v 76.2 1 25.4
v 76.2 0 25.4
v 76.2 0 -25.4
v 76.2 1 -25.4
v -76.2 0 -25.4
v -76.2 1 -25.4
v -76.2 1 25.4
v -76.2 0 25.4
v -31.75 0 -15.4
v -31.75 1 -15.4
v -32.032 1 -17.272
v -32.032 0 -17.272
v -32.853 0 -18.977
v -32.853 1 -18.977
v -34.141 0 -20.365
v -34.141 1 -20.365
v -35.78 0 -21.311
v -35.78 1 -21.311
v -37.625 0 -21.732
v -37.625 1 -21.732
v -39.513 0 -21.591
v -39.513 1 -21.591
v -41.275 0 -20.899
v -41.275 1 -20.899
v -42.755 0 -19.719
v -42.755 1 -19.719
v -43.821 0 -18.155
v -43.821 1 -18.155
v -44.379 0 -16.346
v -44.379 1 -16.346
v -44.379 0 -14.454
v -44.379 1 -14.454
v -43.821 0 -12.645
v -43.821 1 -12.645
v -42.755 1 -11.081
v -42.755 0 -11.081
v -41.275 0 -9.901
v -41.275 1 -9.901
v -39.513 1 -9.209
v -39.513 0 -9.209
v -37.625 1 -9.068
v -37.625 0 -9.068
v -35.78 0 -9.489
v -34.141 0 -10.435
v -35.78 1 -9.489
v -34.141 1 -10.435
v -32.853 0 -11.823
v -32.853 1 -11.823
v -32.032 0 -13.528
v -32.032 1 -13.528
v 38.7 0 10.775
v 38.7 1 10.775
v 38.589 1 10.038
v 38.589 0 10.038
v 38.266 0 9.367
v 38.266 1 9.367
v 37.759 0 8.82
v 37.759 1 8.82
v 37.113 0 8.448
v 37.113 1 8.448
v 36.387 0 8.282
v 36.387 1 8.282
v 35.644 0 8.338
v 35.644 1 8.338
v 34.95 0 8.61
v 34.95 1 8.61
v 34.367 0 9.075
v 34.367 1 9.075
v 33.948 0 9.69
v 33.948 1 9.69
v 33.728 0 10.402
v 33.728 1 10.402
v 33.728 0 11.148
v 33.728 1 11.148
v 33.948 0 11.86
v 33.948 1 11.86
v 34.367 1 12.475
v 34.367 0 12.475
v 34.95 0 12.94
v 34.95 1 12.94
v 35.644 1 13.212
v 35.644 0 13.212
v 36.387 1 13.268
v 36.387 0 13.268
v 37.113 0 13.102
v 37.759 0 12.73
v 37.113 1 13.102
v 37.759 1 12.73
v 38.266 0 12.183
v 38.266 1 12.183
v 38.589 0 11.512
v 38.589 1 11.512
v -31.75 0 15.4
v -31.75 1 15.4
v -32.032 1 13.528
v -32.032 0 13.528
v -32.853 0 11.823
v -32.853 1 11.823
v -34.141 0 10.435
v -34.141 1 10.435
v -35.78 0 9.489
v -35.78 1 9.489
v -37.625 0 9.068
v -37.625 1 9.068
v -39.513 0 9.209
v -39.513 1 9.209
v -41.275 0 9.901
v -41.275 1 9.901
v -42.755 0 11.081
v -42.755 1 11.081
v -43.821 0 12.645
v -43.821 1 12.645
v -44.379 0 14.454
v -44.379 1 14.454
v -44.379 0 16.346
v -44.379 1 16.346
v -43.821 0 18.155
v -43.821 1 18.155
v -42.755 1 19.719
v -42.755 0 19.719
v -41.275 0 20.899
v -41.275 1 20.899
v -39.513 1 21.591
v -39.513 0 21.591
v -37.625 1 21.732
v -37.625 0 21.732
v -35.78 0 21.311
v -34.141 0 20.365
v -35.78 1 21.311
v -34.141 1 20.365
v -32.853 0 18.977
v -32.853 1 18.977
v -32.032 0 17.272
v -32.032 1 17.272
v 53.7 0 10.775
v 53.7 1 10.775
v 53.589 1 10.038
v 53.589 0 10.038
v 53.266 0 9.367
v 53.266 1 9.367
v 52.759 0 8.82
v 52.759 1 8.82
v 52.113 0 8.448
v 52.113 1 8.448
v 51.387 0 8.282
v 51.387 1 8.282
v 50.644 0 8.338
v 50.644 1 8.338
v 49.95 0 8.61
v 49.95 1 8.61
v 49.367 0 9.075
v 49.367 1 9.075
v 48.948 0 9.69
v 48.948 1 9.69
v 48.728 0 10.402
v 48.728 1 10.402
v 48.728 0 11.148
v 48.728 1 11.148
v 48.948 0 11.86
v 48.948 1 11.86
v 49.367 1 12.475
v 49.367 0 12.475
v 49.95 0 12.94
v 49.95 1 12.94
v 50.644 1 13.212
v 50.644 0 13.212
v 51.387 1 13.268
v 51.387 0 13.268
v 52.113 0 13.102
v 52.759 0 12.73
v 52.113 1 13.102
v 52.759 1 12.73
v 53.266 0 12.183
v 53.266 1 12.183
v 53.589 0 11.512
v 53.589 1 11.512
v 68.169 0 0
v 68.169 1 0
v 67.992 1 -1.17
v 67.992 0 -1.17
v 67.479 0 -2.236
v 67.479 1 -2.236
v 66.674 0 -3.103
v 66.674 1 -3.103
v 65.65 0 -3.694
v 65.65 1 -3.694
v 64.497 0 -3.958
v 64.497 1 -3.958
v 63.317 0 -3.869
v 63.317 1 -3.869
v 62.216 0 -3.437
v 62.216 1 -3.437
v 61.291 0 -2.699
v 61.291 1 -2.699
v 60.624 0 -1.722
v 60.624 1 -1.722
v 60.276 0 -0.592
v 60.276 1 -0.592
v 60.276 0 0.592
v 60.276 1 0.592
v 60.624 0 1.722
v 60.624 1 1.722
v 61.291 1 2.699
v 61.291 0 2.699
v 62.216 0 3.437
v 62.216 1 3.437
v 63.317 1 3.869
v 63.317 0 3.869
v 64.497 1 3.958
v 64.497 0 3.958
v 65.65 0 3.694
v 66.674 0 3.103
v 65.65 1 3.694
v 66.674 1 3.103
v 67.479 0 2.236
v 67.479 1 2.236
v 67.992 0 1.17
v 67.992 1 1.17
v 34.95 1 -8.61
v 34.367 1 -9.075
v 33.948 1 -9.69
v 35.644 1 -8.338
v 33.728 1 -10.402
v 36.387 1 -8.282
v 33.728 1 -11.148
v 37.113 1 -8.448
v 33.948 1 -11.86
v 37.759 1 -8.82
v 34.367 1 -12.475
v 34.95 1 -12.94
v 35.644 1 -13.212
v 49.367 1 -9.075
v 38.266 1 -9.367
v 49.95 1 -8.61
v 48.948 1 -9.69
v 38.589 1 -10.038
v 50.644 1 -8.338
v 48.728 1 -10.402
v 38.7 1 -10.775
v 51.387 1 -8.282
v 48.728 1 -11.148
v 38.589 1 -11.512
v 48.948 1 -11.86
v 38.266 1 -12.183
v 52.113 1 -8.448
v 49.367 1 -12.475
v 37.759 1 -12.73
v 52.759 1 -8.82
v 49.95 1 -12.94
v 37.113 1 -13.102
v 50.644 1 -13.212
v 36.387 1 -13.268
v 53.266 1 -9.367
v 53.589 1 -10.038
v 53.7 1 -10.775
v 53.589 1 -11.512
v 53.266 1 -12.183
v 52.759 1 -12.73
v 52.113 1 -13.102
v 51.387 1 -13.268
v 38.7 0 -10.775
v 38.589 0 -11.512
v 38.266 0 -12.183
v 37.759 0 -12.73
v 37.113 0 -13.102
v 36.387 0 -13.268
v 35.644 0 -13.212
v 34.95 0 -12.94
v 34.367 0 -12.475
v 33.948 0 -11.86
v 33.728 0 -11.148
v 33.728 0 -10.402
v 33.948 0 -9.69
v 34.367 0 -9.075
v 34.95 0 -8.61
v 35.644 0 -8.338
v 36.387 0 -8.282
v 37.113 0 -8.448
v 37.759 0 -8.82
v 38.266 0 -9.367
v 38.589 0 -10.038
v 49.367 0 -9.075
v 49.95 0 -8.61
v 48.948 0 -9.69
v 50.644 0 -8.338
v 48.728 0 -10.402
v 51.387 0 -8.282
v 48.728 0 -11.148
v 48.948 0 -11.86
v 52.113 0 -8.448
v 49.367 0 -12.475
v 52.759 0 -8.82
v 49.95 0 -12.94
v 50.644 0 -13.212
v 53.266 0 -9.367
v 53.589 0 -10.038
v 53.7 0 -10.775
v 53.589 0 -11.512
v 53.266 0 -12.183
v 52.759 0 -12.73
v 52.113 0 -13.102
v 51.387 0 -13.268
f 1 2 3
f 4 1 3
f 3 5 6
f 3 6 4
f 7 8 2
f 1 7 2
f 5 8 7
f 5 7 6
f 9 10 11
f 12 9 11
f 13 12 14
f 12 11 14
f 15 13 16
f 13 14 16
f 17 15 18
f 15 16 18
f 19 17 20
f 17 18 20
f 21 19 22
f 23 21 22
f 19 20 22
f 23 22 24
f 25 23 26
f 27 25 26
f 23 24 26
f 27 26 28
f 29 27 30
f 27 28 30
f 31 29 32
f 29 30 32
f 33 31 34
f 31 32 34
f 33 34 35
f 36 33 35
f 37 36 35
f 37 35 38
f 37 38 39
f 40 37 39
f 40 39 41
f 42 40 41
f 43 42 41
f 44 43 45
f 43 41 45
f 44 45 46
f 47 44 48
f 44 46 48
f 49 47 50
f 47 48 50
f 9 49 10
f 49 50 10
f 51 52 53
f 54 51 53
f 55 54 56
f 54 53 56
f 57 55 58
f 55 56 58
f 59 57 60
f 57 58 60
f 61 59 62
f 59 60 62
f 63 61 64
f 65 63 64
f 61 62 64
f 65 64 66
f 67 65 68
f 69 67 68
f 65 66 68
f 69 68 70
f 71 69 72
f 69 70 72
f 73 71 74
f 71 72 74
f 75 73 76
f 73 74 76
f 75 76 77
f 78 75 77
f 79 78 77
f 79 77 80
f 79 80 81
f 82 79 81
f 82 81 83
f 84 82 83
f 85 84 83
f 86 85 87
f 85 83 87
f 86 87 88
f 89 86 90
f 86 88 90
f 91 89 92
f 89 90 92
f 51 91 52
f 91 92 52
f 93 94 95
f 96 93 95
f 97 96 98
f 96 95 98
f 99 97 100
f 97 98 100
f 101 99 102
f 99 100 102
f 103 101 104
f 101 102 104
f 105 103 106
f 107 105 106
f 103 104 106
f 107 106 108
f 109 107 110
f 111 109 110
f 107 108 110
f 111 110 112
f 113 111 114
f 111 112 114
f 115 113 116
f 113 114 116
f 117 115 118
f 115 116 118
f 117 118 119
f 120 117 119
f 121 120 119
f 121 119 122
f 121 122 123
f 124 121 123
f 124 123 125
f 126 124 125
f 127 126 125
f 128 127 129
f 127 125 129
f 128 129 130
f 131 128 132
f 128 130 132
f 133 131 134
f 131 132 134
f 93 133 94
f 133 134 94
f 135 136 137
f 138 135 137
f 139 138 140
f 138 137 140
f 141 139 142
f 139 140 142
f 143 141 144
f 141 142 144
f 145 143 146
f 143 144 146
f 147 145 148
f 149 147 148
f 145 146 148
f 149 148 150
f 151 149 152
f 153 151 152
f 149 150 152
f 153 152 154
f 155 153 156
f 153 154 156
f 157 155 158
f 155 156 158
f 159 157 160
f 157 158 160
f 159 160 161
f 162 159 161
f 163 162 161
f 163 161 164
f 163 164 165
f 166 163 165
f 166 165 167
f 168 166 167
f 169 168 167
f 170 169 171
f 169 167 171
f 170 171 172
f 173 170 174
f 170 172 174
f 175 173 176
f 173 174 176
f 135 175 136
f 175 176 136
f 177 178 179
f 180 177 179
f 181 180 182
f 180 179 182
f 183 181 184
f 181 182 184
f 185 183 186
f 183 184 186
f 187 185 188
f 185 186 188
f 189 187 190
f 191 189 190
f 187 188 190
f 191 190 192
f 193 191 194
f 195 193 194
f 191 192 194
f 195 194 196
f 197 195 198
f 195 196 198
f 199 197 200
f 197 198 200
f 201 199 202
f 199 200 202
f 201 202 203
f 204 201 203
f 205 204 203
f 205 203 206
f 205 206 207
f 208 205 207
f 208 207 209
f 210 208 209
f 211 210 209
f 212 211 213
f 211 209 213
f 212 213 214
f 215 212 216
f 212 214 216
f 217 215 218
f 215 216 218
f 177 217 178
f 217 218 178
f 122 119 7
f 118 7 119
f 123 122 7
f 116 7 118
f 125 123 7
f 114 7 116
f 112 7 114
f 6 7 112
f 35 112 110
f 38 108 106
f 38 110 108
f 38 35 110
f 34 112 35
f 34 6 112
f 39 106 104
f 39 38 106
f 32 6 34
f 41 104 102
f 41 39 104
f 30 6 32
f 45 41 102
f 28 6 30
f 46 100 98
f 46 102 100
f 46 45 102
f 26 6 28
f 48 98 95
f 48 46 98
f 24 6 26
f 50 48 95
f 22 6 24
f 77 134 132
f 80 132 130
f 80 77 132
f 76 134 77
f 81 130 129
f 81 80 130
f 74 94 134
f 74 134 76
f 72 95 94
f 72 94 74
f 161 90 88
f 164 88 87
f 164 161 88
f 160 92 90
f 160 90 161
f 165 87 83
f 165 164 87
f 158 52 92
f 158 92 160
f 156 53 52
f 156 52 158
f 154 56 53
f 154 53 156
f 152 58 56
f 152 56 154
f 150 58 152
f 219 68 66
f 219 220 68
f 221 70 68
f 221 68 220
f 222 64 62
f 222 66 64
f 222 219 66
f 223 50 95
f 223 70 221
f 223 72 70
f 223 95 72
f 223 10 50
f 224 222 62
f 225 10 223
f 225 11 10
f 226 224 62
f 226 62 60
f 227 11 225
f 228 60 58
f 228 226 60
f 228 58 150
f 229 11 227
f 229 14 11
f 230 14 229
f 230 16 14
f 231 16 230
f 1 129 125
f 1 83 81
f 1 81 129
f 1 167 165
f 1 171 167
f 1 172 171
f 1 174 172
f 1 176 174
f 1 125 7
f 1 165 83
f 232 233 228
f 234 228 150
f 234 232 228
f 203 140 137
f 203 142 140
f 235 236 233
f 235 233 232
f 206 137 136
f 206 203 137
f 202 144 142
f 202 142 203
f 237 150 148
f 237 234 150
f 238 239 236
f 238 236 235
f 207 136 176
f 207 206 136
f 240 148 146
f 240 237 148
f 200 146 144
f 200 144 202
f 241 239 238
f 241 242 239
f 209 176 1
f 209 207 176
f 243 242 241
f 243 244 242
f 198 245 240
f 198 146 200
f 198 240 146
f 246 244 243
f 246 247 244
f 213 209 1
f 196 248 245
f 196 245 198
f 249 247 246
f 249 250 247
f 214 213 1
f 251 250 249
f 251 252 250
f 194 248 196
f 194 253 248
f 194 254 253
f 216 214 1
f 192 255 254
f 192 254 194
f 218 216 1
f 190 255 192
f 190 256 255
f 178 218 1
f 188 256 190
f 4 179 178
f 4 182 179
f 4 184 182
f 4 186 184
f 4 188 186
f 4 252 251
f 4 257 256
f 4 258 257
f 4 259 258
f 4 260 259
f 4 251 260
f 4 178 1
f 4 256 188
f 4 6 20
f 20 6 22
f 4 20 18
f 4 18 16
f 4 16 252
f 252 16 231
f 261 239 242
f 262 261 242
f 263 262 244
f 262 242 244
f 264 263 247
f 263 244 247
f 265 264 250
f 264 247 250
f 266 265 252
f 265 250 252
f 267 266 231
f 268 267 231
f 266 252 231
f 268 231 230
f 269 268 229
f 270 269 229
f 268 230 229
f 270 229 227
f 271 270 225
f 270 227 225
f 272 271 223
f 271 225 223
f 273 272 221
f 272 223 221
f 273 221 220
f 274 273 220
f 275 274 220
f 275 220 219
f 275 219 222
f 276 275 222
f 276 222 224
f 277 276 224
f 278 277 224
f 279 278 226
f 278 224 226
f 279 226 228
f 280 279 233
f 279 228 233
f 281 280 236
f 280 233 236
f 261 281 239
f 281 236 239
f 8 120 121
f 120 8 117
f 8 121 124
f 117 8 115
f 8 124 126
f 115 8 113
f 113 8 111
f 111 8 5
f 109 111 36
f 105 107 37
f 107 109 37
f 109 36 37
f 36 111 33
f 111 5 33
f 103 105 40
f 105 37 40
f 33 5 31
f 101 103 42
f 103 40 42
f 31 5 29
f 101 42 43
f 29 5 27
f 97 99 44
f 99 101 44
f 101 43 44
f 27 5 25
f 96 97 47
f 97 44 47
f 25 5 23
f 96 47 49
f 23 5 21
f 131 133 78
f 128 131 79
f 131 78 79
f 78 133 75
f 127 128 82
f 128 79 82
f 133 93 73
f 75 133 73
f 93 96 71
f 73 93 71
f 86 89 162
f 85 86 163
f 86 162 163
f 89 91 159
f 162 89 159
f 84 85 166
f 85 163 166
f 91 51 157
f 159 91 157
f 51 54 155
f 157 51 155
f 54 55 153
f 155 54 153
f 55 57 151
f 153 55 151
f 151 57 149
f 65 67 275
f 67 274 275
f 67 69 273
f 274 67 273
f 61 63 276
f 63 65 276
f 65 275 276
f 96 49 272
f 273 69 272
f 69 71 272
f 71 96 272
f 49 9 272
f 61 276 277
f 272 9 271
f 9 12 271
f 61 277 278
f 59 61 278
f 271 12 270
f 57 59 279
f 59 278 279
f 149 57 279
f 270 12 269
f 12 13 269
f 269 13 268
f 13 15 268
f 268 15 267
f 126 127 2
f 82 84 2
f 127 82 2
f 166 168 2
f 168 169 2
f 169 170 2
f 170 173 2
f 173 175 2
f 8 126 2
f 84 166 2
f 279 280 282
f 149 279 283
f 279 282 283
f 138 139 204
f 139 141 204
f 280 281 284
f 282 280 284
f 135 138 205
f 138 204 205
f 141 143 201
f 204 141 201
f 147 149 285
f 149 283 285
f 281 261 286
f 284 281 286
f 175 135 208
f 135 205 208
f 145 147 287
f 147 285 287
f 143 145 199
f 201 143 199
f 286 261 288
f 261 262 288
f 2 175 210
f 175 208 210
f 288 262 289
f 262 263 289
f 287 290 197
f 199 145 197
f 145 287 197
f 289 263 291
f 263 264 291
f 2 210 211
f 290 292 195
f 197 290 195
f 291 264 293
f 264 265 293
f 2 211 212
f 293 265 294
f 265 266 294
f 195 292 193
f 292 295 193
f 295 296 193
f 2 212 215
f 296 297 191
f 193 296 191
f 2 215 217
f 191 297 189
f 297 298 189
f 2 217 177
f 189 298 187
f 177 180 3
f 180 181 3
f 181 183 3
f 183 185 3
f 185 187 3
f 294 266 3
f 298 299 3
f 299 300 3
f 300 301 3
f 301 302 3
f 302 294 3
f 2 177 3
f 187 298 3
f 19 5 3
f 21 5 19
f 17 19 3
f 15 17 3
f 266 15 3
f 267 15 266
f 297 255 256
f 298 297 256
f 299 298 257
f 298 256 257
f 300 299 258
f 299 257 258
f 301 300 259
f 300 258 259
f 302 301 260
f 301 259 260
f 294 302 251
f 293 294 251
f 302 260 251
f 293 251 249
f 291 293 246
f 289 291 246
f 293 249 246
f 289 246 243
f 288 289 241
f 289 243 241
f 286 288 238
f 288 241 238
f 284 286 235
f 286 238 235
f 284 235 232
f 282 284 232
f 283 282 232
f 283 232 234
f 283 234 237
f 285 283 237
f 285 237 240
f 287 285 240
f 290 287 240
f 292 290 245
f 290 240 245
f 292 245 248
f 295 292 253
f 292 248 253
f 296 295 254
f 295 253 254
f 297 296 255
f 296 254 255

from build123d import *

# Parameters (mm, degrees)
ESQUISSE1_W             = 152.4
ESQUISSE1_H             = 50.8
BOSS_EXTRU_1_DEPTH      = 1
ESQUISSE2_R             = 6.35
ENL_V_MAT_EXTRU_1_DEPTH = 1
ESQUISSE3_R             = 2.5
ENL_V_MAT_EXTRU_2_DEPTH = 1
ESQUISSE4_R             = 3.96875
ENL_V_MAT_EXTRU_3_DEPTH = 1


with BuildPart() as part:
    # Esquisse1 → Boss.-Extru.1 (new body)
    with BuildSketch(Plane(origin=(0, 0, 0), x_dir=(1, 0, 0), z_dir=(0, 1, 0))):
        Rectangle(ESQUISSE1_W, ESQUISSE1_H)
    extrude(amount=BOSS_EXTRU_1_DEPTH)

    # Esquisse2 → Enlèv. mat.-Extru.1 (cut)
    with BuildSketch(Plane(origin=(0, 1, 0), x_dir=(1, 0, 0), z_dir=(0, 1, 0))):
        with Locations((-38.1, 15.4)):
            Circle(ESQUISSE2_R)
        with Locations((-38.1, -15.4)):
            Circle(ESQUISSE2_R)
    extrude(amount=-ENL_V_MAT_EXTRU_1_DEPTH, mode=Mode.SUBTRACT)

    # Esquisse3 → Enlèv. mat.-Extru.2 (cut)
    with BuildSketch(Plane(origin=(0, 1, 0), x_dir=(1, 0, 0), z_dir=(0, 1, 0))):
        with Locations((51.2, 10.775)):
            Circle(ESQUISSE3_R)
        with Locations((36.2, 10.775)):
            Circle(ESQUISSE3_R)
        with Locations((36.2, -10.775)):
            Circle(ESQUISSE3_R)
        with Locations((51.2, -10.775)):
            Circle(ESQUISSE3_R)
    extrude(amount=-ENL_V_MAT_EXTRU_2_DEPTH, mode=Mode.SUBTRACT)

    # Esquisse4 → Enlèv. mat.-Extru.3 (cut)
    with BuildSketch(Plane(origin=(0, 1, 0), x_dir=(1, 0, 0), z_dir=(0, 1, 0))):
        with Locations((64.2, 0)):
            Circle(ESQUISSE4_R)
    extrude(amount=-ENL_V_MAT_EXTRU_3_DEPTH, mode=Mode.SUBTRACT)


solid = part.part
